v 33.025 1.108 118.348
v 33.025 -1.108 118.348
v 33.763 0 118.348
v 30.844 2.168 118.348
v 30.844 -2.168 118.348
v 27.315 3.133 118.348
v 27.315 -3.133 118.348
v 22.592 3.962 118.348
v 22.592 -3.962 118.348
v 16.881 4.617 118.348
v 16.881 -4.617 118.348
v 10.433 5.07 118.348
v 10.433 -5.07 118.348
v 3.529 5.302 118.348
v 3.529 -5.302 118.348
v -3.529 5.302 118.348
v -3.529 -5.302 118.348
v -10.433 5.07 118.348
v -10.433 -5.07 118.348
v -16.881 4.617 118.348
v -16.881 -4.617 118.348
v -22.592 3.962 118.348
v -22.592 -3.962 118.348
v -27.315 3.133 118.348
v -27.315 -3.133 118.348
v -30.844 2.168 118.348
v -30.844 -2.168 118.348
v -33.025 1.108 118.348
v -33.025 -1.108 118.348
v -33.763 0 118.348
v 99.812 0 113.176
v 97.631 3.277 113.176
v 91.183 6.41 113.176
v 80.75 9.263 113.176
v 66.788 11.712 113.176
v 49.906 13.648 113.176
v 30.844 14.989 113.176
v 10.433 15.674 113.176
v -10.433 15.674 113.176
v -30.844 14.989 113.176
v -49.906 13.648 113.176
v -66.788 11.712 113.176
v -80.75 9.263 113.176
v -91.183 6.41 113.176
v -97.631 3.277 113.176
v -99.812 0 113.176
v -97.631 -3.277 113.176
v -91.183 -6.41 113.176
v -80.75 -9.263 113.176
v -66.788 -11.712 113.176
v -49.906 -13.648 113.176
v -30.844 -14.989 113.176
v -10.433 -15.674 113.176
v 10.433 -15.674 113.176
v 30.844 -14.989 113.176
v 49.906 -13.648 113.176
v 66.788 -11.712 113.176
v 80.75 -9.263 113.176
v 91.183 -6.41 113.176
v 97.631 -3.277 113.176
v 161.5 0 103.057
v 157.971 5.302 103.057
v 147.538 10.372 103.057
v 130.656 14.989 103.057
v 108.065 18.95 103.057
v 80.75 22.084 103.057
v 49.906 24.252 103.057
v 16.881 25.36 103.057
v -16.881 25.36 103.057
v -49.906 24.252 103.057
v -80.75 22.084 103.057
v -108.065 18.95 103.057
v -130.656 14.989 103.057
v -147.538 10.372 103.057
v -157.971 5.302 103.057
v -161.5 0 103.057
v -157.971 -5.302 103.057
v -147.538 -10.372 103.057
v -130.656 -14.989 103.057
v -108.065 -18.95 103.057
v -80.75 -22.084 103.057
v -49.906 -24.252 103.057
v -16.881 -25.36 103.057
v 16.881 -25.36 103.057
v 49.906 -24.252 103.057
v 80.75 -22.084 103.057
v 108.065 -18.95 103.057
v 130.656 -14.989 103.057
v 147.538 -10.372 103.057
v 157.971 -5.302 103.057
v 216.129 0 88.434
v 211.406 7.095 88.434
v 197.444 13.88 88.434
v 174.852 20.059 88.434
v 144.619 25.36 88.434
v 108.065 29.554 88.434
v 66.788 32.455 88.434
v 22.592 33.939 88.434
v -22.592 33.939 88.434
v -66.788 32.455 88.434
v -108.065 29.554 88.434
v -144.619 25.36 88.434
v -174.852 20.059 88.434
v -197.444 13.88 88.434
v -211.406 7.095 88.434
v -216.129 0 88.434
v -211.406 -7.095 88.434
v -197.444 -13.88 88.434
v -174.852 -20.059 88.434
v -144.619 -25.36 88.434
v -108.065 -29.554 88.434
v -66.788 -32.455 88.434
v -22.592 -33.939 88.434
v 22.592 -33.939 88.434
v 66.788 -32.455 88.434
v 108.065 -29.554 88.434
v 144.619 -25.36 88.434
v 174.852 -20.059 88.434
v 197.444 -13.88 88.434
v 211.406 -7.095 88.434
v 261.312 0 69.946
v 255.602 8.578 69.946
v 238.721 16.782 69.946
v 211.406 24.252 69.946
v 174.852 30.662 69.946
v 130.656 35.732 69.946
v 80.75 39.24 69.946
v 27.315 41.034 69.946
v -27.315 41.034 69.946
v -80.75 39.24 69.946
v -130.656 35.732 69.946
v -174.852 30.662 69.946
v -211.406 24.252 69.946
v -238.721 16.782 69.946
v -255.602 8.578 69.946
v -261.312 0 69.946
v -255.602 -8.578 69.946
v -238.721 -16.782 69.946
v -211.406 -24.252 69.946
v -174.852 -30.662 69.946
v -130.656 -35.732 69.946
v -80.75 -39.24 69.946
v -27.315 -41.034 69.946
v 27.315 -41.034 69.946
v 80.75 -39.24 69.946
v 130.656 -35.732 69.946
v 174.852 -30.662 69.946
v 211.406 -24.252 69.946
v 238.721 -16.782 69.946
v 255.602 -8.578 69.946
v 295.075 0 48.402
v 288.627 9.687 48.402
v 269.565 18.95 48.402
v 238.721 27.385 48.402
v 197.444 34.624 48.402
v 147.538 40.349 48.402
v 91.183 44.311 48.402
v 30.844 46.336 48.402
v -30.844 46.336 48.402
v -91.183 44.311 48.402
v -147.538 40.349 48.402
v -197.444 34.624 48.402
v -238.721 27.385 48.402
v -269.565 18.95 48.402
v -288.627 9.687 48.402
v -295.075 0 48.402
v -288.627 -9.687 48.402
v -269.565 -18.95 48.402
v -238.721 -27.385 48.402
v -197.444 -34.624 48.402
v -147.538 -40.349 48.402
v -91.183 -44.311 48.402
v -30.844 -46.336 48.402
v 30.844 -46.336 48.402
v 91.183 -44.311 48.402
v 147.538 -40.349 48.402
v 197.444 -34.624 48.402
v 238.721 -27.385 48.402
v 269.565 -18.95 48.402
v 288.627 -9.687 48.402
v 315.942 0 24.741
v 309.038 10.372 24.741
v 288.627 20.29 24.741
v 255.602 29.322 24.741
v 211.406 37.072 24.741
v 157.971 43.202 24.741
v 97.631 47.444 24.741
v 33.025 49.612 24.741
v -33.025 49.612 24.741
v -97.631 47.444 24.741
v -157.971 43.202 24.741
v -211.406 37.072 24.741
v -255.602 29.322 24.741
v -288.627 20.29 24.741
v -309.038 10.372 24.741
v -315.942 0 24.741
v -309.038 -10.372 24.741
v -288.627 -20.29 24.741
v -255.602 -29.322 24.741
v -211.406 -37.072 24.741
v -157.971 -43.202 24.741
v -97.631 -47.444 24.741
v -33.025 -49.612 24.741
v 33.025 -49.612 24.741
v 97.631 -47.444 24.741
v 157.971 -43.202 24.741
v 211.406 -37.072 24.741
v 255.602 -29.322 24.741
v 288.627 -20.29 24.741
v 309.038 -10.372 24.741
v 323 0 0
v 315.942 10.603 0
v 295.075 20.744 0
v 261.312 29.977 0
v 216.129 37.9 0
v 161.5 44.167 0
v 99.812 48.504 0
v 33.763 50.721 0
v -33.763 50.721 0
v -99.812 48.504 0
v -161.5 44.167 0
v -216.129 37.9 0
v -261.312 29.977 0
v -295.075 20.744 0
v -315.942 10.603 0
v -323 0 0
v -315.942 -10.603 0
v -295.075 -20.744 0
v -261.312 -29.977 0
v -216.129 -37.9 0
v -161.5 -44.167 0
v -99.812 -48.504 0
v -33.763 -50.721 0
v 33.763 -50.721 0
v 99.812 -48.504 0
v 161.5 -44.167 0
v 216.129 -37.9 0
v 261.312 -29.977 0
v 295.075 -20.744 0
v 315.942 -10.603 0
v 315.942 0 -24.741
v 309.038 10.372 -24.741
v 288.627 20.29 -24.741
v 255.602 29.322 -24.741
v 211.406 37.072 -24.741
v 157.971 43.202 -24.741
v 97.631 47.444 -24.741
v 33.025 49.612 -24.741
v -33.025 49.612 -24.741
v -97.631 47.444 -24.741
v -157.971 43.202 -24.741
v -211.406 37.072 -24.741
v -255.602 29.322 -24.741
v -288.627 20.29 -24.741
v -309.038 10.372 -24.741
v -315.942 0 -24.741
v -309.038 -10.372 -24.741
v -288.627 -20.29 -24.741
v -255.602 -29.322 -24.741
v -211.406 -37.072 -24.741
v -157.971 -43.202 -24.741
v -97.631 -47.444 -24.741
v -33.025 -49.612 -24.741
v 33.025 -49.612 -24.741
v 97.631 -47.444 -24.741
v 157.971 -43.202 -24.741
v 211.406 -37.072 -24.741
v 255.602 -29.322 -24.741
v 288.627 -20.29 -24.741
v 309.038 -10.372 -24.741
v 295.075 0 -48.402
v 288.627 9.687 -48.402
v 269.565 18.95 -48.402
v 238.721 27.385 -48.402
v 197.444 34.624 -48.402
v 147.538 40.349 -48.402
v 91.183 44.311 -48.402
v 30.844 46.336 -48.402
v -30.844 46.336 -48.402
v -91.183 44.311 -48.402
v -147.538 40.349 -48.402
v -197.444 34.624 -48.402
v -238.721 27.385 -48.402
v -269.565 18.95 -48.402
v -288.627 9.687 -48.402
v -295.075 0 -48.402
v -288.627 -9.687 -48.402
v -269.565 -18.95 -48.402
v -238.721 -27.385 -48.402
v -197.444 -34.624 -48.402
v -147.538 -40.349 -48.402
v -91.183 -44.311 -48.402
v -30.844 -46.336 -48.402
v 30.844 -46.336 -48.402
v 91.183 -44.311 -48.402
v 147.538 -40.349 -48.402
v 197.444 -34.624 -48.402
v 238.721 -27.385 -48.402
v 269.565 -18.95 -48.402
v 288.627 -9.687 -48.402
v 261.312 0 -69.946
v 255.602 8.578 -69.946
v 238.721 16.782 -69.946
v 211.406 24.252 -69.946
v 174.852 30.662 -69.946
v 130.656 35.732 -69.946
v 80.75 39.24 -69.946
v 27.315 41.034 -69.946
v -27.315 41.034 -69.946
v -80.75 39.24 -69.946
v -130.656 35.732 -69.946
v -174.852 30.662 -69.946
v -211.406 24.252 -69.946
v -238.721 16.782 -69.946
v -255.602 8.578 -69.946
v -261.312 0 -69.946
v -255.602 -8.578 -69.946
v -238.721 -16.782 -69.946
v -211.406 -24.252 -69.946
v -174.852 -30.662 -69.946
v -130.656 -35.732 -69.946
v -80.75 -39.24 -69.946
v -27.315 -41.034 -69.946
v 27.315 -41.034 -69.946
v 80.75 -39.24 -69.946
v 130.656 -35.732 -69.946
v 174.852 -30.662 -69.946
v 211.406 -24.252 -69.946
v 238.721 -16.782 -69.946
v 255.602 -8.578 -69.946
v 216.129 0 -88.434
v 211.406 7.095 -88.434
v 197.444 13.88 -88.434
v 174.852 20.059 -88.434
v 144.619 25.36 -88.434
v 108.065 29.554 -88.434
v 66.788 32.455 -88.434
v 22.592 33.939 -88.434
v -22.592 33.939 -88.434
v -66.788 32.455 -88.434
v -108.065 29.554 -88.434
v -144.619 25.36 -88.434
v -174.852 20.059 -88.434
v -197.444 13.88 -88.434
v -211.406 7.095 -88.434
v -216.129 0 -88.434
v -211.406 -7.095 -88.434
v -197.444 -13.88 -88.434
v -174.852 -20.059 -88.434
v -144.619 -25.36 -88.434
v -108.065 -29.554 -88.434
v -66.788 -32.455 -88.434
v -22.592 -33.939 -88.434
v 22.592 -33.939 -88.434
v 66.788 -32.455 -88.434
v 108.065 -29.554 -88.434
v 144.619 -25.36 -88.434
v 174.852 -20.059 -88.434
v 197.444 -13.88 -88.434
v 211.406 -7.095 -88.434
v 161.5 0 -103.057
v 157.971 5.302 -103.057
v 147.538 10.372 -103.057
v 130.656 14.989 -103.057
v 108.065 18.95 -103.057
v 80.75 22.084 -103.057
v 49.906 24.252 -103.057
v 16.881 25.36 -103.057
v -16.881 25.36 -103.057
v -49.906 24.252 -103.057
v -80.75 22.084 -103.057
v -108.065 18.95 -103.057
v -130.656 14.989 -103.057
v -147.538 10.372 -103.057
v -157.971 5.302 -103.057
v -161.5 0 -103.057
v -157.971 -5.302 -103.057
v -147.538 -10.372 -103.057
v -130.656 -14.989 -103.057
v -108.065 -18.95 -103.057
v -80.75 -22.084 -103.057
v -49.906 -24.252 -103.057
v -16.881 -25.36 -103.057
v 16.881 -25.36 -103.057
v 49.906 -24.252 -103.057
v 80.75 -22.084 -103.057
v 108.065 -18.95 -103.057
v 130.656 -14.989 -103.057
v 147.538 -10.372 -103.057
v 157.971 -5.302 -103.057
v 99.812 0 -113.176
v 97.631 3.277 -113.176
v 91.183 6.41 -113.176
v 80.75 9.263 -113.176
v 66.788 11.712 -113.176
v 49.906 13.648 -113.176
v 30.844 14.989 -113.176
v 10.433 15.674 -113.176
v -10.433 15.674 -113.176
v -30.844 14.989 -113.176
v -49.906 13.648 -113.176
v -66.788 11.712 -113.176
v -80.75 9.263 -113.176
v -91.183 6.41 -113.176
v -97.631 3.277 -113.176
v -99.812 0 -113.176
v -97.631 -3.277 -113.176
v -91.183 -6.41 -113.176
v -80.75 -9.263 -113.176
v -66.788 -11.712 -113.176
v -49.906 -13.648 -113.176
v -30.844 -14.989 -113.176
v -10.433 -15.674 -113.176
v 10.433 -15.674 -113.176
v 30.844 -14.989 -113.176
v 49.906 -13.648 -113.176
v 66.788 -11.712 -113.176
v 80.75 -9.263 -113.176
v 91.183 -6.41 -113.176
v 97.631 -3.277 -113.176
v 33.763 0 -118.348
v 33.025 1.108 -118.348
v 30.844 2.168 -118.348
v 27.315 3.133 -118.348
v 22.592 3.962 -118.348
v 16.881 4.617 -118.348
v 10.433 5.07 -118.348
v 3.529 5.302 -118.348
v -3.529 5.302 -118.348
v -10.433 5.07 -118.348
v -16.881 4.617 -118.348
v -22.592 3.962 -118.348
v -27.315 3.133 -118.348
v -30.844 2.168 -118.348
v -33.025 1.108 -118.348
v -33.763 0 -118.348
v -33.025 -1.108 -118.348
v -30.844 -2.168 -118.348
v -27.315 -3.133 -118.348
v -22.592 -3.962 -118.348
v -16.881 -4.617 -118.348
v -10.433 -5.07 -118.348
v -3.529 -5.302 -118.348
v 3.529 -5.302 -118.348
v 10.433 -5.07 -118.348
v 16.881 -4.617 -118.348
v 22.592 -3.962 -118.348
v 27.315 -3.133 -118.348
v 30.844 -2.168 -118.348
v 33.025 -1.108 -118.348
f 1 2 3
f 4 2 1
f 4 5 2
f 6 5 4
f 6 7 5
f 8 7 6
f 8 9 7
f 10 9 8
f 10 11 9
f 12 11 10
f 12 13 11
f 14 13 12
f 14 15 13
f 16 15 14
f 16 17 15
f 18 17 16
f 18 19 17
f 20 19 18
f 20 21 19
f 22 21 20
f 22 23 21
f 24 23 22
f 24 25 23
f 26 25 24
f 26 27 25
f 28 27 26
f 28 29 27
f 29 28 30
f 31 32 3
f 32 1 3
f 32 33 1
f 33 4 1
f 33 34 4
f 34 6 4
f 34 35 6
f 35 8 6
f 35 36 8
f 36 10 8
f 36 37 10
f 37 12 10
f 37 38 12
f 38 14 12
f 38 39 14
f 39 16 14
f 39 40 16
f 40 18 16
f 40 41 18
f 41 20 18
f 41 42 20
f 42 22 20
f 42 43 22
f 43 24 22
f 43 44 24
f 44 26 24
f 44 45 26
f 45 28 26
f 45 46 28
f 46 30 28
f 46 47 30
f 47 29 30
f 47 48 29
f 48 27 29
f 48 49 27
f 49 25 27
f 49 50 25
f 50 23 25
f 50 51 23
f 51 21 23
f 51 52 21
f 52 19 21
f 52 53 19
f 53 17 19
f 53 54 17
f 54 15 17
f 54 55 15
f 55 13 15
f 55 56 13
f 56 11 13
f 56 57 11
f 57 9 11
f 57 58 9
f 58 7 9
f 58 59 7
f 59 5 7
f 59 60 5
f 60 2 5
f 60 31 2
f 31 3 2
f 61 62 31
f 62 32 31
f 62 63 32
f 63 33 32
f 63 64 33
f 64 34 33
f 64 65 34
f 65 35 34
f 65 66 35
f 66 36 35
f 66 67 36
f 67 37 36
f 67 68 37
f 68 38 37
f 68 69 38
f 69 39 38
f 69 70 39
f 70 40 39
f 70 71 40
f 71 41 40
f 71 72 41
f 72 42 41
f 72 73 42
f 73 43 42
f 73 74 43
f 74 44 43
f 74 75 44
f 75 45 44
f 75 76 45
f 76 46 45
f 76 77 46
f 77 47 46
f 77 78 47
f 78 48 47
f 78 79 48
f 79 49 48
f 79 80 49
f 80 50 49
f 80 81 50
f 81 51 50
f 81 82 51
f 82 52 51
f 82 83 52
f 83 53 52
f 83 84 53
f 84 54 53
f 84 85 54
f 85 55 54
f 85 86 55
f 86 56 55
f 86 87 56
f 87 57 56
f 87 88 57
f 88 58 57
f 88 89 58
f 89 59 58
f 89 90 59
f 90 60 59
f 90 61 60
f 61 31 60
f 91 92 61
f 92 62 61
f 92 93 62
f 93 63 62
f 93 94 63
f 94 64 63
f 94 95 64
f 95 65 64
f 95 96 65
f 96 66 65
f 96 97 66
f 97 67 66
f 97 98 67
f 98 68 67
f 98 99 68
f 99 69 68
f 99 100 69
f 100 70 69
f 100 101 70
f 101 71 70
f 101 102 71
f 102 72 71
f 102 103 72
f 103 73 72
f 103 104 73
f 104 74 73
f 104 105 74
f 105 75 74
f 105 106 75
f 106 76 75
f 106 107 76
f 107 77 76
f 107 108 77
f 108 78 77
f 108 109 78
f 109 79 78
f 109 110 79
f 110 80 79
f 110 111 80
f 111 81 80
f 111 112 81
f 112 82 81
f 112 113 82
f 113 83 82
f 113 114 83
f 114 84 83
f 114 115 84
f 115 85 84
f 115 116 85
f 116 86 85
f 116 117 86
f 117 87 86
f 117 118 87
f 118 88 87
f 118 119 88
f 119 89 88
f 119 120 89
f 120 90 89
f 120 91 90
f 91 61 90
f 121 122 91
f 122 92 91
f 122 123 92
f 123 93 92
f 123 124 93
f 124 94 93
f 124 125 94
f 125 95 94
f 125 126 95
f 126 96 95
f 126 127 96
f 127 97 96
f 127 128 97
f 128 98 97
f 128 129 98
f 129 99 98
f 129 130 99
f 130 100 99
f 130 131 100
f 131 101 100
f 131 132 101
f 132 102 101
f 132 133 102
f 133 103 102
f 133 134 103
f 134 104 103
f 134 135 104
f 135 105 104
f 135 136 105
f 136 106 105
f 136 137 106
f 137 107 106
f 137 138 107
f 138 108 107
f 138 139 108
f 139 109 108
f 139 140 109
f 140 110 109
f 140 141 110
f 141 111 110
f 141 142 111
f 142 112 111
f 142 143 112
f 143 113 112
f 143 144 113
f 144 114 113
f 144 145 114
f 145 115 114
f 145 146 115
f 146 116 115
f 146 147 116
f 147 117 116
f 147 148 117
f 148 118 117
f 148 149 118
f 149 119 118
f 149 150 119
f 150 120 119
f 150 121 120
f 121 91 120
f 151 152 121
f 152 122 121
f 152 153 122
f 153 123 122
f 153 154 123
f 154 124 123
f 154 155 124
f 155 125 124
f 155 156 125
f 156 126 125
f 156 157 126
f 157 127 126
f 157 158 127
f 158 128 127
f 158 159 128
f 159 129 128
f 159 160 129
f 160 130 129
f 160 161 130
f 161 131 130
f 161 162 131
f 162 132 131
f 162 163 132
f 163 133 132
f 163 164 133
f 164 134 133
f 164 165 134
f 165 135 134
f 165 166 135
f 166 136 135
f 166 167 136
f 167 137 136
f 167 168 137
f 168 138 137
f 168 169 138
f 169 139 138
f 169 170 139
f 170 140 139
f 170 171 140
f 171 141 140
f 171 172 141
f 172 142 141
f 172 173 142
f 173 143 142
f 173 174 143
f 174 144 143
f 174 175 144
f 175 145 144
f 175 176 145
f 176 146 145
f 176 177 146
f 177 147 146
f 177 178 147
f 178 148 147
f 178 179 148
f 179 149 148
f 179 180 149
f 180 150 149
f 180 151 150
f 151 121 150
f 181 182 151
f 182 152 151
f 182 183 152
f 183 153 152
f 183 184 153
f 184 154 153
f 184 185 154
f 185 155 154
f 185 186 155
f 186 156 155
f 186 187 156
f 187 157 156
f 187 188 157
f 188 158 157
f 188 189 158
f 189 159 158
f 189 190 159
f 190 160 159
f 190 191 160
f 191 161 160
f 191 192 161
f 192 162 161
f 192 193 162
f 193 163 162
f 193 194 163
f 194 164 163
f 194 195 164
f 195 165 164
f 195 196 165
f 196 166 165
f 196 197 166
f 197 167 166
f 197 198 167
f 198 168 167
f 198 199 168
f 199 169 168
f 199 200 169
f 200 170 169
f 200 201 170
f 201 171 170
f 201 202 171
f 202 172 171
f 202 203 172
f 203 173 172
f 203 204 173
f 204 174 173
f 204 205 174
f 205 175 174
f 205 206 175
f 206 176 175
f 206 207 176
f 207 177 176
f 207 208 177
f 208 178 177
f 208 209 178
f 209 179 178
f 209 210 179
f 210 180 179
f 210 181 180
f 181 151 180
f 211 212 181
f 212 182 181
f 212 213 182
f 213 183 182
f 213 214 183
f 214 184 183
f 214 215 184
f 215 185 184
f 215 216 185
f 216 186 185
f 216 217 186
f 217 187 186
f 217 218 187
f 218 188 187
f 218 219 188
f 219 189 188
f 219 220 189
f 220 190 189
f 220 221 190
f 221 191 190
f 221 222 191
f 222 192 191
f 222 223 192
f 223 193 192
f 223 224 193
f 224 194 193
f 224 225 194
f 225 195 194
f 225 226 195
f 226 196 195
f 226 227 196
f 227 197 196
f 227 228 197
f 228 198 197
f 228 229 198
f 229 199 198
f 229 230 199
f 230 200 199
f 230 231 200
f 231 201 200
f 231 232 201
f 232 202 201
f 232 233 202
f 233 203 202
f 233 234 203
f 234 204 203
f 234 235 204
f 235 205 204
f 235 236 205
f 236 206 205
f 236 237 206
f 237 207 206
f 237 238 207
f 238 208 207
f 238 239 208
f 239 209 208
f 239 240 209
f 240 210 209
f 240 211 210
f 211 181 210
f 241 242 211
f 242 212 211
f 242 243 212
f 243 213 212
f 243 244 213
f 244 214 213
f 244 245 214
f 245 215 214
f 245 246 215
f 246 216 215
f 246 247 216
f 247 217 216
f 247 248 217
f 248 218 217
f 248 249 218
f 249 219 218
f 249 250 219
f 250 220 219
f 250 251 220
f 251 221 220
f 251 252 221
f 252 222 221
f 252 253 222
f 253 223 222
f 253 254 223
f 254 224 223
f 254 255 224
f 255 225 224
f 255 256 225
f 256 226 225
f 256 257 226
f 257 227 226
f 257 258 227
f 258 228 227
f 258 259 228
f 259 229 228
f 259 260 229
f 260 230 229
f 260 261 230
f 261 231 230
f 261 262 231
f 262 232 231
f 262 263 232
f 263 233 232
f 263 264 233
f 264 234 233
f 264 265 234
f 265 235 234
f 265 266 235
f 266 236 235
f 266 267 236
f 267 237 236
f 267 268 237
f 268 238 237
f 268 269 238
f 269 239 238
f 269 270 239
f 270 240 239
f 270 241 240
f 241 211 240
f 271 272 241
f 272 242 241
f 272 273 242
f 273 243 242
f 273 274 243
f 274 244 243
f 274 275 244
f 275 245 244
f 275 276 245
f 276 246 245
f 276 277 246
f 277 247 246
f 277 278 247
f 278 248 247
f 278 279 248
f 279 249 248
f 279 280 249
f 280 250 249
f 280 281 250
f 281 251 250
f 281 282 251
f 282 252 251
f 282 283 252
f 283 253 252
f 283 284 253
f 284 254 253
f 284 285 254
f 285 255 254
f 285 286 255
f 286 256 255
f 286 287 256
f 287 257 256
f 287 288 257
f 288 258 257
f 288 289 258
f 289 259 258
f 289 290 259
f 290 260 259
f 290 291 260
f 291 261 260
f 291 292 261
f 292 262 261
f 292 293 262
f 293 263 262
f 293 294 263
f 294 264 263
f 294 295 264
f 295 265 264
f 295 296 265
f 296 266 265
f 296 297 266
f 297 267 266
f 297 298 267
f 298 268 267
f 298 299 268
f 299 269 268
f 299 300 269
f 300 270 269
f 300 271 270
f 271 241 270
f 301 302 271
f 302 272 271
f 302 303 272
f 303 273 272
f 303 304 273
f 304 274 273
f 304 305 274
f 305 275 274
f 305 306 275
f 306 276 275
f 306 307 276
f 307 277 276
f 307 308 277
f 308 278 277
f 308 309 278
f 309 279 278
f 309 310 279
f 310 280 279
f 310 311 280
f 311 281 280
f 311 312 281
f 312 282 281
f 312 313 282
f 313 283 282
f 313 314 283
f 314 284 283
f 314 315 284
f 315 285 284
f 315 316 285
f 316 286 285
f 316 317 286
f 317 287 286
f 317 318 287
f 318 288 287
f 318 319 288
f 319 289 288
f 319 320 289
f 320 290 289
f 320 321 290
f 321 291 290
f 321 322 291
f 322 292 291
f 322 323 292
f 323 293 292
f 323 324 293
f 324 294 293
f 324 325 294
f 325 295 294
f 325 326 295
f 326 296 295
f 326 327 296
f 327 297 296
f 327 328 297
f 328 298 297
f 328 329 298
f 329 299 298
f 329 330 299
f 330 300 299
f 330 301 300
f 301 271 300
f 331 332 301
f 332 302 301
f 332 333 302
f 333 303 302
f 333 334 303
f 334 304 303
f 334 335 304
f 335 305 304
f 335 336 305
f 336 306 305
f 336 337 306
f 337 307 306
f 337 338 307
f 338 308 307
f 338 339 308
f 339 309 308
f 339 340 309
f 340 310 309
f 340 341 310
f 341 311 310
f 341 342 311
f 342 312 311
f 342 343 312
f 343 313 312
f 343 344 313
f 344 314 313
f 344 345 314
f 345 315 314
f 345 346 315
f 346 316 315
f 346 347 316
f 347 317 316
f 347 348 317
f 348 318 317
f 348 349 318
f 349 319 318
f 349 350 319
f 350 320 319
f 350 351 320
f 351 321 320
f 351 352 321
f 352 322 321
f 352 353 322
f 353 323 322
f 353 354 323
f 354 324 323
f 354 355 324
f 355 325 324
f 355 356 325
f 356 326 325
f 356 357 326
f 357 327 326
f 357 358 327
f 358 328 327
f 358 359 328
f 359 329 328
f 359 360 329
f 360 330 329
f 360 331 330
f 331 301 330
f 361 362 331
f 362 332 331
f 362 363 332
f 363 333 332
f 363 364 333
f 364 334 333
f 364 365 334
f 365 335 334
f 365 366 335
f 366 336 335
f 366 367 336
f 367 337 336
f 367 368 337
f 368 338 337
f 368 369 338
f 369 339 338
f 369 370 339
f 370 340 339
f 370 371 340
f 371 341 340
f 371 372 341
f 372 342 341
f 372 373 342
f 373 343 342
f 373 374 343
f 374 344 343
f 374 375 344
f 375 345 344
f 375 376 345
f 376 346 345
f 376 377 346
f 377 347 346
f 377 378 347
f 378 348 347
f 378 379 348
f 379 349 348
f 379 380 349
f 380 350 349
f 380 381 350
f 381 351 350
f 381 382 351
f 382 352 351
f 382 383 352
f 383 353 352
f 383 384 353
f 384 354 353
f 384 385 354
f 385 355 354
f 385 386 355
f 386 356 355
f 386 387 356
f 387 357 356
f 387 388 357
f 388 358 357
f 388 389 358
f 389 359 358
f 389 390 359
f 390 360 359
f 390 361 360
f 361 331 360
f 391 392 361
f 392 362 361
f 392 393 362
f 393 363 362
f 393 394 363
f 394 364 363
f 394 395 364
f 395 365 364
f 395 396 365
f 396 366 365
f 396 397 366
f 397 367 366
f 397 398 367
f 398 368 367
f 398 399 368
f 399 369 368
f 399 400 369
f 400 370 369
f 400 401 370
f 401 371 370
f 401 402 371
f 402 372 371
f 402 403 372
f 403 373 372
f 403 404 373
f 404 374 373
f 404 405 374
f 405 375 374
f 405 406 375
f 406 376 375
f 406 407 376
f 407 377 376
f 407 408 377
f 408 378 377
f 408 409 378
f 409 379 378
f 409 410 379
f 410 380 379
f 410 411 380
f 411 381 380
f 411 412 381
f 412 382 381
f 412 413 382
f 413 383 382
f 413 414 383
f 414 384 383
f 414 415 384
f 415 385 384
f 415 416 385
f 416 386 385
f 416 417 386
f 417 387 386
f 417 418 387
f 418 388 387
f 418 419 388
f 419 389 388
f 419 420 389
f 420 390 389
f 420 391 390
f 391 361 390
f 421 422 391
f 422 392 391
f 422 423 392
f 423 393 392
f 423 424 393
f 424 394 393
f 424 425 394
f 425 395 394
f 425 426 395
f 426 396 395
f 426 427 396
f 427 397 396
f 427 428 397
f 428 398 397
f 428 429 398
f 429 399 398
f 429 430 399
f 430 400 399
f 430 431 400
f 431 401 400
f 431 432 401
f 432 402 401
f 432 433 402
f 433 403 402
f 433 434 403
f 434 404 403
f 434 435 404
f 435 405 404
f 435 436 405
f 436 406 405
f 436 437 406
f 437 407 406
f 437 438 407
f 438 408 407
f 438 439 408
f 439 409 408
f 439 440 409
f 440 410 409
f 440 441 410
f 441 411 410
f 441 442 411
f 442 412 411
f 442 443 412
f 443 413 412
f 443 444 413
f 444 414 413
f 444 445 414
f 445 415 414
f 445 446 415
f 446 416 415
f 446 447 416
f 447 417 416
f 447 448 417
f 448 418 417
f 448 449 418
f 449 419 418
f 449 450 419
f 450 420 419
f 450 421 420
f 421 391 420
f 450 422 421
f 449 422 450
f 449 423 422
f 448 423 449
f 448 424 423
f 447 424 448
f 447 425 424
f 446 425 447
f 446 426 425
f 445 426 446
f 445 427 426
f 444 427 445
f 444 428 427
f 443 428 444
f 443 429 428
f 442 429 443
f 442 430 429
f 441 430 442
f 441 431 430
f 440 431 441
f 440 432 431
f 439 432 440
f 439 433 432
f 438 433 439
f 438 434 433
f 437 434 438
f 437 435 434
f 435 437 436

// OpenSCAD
// Generated by SolidPython 1.0.1 on 2020-07-29 00:46:53


scale(v = [19, 3, 7]) {
	sphere(r = 17);
}
/***********************************************
*********      SolidPython code:      **********
************************************************
 
# import packages: SolidPython
from solid import *
from solid.utils import *
from itertools import chain, combinations, permutations


class Resize:

    def __init__(self, scad_file):
        self.scad_file = scad_file
        #self.scad_file = import_scad(scad_file)
        # cone/cylinder param:
        self.r1 = 0
        self.r2 = 0
        self.h = 0
        # rectangular prism param:
        self.w = 0
        self.l = 0
        # ellipse param:
        self.r = 0

    # import OpenScad code (file name corresponds to shape)


    # classify shape + parameters
    def assign(self, param1, param2, param3):
        if self.scad_file == 'cone.scad':
            self.r1 = param1
            self.r2 = param2
            self.h = param3
        elif self.scad_file == 'cylinder.scad':
            self.r1 = param1
            self.r2 = param2
            self.h = param3
        elif self.scad_file == 'rectangularPrism.scad':
            self.h = param1
            self.l = param2
            self.w = param3
        else:
            self.r = param1
            self.h = param2

    # resize parameters
    def iterate(self):
        x = range(3, 20, 2)
        i = 1
        if self.scad_file == 'cone.scad':
            tempList = list(permutations(x, 2))
            for temp in tempList:
                param1 = temp[0]
                param2 = temp[1]
                filepath = 'produced_scad_files/' + 'cone' + str(param1) + '_' + str(param2) + '_' + '.scad'
                scad_render_to_file(cylinder(h=param1, r1=param2, r2=0), filepath)

        elif self.scad_file == 'cylinder.scad':
            tempList = list(permutations(x, 3))
            for temp in tempList:
                param1 = temp[0]
                param2 = temp[1]
                filepath = 'produced_scad_files/' + 'cylinder' + str(param1) + '_' + str(param2) + '_' + '.scad'
                scad_render_to_file(cylinder(h=param1, r1=param2, r2=param2), filepath)

        elif self.scad_file == 'rectangularPrism.scad':
            tempList = list(permutations(x, 3))
            for temp in tempList:
                param1 = temp[0]
                param2 = temp[1]
                param3 = temp[2]
                filepath = 'produced_scad_files/' + 'rectangularPrism' + str(param1) + '_' + str(param2) + '_' + str(
                    param3) + '.scad'
                scad_render_to_file(cube(size=(param1, param2, param3)), filepath)

        elif self.scad_file == 'ellipse.scad':
            tempList = list(permutations(x, 4))
            for temp in tempList:
                param1 = temp[0]
                param2 = temp[1]
                param3 = temp[2]
                param4 = temp[3]
                filepath = 'produced_scad_files/' + 'ellipse' + str(param1) + '_' + str(param2) + '_' + str(param3) + '_' + str(param4) + '.scad'
                scad_render_to_file(scale([param1, param2, param3])(sphere(r=param4)), filepath)

    def render_to_scadfile(self):
        scad_render_to_file(scad, 'example.scad') 
 
************************************************/
